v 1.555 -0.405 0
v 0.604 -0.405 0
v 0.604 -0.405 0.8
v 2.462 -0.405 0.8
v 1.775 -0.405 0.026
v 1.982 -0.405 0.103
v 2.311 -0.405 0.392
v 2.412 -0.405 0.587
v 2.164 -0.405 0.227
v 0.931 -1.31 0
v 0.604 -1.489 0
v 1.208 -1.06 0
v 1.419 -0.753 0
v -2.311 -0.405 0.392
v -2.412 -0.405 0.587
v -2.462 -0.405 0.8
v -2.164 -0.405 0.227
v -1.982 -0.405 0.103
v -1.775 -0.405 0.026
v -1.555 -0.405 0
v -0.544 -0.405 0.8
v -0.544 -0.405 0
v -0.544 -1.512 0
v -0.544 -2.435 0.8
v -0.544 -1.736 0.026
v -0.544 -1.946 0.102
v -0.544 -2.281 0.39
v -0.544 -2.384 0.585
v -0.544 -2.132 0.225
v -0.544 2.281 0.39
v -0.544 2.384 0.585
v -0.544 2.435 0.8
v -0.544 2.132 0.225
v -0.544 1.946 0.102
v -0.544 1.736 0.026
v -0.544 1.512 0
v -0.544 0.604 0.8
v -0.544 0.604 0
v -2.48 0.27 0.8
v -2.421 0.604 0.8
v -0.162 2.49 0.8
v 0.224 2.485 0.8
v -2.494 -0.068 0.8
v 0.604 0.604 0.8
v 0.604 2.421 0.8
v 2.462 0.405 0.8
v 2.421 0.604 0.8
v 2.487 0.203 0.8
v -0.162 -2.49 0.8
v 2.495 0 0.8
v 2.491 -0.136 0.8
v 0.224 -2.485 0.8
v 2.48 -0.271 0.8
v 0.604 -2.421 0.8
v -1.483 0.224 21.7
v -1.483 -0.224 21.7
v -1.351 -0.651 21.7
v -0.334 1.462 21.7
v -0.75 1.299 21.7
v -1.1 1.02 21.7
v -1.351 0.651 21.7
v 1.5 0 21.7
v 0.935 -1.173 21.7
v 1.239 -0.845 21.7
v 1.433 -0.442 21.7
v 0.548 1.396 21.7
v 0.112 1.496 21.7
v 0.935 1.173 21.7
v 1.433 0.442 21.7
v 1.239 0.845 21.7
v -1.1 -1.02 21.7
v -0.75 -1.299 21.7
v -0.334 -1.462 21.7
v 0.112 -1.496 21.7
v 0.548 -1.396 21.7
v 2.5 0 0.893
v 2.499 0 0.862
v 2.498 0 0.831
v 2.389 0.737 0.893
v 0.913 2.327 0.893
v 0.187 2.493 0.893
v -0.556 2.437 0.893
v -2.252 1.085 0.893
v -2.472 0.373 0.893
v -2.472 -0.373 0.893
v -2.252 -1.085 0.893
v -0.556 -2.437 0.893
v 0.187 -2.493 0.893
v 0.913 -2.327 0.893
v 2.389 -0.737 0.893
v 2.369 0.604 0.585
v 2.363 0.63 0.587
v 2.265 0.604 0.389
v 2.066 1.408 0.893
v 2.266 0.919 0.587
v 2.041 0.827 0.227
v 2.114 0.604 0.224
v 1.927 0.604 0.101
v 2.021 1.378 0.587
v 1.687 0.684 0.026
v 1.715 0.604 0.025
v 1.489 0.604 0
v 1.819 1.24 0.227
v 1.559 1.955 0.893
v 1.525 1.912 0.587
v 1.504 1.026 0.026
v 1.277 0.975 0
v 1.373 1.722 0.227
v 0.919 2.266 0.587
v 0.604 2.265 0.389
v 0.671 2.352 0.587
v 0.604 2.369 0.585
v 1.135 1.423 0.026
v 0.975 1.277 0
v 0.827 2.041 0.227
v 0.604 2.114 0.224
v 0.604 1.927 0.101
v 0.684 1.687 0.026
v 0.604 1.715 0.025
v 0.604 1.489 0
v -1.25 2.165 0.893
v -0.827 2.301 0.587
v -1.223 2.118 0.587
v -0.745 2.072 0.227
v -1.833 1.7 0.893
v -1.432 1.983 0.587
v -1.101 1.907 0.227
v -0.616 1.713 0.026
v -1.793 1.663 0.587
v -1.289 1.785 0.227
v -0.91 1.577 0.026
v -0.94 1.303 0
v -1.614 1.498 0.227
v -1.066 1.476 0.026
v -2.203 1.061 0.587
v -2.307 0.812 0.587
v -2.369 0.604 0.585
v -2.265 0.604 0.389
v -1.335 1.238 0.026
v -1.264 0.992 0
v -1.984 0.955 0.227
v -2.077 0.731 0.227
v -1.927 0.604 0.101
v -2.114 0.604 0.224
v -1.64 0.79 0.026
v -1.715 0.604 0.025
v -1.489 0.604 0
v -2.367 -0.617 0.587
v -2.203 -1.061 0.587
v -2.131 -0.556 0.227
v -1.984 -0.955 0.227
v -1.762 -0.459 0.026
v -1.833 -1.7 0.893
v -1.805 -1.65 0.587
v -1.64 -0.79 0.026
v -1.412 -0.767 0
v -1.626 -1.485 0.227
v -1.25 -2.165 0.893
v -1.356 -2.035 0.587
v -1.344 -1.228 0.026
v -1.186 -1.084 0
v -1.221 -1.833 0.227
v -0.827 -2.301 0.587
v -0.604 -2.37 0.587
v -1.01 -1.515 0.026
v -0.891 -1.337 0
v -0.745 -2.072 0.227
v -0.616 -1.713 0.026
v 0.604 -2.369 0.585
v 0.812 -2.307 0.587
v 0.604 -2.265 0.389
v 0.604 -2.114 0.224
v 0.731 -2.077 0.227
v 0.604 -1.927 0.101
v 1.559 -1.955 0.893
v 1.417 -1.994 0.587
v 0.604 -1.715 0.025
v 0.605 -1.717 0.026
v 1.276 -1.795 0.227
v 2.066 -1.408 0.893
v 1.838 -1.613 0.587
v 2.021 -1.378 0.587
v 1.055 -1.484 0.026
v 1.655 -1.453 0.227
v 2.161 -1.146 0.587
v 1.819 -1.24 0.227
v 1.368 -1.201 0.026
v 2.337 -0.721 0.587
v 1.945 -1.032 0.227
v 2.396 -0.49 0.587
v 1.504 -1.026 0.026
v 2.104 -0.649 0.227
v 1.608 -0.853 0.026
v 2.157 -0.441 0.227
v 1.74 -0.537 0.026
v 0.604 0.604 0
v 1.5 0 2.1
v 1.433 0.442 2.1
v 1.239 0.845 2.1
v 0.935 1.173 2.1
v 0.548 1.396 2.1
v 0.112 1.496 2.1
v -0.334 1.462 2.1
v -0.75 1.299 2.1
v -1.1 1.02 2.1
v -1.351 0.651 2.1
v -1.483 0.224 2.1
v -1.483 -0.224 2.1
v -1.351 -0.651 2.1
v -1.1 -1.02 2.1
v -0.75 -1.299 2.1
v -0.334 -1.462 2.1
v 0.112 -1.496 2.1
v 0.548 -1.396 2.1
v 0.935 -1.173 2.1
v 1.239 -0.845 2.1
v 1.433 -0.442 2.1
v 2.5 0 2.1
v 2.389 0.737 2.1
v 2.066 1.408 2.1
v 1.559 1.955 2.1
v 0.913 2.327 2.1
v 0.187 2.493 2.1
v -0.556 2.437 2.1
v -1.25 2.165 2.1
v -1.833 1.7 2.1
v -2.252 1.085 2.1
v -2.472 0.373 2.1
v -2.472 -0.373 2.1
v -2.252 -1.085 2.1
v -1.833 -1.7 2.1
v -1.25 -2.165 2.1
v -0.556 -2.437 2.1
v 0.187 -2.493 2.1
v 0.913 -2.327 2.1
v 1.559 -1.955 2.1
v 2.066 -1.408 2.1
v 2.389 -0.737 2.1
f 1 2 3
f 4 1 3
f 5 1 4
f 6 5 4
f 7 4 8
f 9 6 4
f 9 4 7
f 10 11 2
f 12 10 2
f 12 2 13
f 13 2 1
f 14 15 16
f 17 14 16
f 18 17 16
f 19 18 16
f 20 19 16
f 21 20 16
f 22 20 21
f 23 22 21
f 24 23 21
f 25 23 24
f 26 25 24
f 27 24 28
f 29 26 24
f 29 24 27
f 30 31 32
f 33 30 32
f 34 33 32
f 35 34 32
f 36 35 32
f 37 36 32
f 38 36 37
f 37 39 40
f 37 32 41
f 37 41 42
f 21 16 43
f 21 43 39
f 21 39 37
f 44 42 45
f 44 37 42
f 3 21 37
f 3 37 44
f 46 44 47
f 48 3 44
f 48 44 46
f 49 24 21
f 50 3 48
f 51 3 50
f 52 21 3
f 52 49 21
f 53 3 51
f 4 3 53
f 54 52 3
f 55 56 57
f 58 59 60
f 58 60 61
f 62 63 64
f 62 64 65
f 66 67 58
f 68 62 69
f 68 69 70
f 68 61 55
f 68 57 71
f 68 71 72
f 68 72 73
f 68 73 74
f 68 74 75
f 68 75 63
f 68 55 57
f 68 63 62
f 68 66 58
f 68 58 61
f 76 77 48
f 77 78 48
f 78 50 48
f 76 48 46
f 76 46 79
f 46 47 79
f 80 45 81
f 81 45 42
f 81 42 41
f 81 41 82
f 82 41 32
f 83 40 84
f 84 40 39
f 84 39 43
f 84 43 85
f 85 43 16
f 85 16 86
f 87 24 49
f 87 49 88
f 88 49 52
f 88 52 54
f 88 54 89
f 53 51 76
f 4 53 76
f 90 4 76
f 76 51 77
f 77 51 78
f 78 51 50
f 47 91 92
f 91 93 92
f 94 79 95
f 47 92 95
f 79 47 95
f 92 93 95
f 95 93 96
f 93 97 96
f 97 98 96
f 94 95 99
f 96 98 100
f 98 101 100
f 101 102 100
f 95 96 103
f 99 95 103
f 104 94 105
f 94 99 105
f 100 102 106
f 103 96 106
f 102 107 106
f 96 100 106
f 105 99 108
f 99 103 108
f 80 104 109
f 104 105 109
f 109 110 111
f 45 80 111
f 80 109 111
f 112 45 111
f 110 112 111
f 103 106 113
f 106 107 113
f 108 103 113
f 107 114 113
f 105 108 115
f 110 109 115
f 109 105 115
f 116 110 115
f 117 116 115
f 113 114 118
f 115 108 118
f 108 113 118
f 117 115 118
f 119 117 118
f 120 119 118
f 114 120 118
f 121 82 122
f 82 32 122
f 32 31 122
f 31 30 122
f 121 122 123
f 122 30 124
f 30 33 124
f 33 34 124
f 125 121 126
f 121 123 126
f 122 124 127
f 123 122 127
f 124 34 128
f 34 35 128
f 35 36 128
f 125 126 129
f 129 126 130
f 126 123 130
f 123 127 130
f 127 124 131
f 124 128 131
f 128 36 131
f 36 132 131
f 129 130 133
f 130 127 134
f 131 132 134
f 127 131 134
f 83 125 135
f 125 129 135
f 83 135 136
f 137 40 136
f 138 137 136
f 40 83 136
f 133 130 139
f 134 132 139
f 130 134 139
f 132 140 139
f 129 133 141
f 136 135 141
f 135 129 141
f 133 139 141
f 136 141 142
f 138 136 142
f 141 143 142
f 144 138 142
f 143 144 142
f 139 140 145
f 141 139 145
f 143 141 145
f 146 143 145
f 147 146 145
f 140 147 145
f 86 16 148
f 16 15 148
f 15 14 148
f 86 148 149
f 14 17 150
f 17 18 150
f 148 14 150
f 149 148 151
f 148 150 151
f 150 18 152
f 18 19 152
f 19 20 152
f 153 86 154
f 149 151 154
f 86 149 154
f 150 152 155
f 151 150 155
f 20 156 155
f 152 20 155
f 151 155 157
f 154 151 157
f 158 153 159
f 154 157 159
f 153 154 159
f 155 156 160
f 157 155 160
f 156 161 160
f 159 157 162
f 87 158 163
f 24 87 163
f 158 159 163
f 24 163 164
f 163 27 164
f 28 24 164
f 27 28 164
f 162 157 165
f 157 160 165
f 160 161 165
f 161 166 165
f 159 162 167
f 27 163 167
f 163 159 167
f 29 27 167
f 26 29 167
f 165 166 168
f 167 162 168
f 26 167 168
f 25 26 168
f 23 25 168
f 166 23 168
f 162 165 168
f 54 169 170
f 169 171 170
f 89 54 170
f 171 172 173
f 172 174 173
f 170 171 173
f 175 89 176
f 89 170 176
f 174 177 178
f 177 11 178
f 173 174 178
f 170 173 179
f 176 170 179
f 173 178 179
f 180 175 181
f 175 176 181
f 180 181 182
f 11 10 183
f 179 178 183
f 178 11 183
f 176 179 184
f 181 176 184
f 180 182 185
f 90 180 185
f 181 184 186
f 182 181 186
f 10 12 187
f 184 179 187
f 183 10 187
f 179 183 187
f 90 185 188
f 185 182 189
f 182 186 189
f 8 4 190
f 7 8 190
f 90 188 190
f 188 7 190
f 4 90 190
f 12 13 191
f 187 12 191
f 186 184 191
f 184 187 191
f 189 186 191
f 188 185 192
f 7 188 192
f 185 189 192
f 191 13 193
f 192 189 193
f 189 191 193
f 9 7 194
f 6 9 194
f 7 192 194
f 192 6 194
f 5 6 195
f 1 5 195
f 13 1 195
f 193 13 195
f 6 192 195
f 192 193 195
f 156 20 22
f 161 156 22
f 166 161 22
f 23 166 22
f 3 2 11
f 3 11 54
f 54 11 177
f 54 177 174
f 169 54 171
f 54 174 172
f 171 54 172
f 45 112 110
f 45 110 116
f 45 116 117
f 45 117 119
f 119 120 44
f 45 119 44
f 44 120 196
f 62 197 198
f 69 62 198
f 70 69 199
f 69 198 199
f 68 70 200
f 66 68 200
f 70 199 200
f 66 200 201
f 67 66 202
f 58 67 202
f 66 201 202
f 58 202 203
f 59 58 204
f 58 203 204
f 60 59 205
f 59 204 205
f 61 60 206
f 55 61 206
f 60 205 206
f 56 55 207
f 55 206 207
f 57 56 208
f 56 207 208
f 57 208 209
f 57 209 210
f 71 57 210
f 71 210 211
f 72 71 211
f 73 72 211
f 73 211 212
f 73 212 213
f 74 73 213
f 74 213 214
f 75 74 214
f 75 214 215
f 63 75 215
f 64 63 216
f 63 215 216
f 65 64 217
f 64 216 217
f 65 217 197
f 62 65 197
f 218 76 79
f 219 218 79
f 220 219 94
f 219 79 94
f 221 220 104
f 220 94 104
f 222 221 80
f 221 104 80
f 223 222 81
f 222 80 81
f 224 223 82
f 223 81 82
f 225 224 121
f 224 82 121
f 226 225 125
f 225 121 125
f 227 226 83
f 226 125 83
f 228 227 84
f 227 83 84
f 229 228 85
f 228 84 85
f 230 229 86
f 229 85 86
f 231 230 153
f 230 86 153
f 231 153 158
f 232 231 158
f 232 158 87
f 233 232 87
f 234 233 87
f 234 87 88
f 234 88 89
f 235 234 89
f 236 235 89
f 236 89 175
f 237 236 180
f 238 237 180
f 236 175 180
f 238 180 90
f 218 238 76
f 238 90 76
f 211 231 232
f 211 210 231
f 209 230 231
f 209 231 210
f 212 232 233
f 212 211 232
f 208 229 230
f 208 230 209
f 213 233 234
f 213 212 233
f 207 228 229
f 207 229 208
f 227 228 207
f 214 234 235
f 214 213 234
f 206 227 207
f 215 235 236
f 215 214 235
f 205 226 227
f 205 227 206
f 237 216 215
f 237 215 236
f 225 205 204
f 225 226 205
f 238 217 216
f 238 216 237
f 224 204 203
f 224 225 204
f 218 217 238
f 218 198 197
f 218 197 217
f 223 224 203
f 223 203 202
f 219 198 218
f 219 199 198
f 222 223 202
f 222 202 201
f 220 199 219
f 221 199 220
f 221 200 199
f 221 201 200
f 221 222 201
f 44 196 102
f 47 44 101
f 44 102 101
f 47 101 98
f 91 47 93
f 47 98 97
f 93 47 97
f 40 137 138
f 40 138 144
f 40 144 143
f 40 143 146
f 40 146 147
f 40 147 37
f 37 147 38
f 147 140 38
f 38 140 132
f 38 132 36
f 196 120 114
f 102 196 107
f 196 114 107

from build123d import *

# Parameters (mm, degrees)
F0_R     = 2.5
F1_DEPTH = 2.1
F2_R     = 1.5
F3_DEPTH = 19.6
F4_R     = 0.8932590181
F5_W     = 2.3426773259
F5_H     = 1.0091533186
F5_W_2   = 1.1473111808
F5_H_2   = 2.1985126659
F5_W_3   = 2.6310068788
F5_H_3   = 1.9702516729
F6_DEPTH = 0.8


with BuildPart() as f1:
    # F0 (on Top) → F1 (new body)
    with BuildSketch(Plane.XY):
        Circle(F0_R)
    extrude(amount=F1_DEPTH)

    # F2 (on face) → F3 (join)
    with BuildSketch(Plane.XY.offset(2.1)):
        Circle(F2_R)
    extrude(amount=F3_DEPTH)

    # F4
    f4_edges = [f1.edges().sort_by_distance(p)[0] for p in [
        (-2.5, 0, 0),
    ]]
    fillet(f4_edges, radius=F4_R)

    # F5 (on face) → F6 (cut)
    with BuildSketch(Plane(origin=(0, 0, 0), x_dir=(1, 0, 0), z_dir=(0, 0, -1))):
        with Locations((-1.7149599153, -0.0991132692)):
            Rectangle(F5_W, F5_H)
        with Locations((0.0300343381, 1.504719723)):
            Rectangle(F5_W_2, F5_H_2)
        with Locations((0.0300343381, -0.0991132692)):
            Rectangle(F5_W_2, F5_H)
        with Locations((1.9191933679, -0.0991132692)):
            Rectangle(F5_W_3, F5_H)
        with Locations((0.0300343381, -1.588815765)):
            Rectangle(F5_W_2, F5_H_3)
    extrude(amount=-F6_DEPTH, mode=Mode.SUBTRACT)


solid = f1.part
